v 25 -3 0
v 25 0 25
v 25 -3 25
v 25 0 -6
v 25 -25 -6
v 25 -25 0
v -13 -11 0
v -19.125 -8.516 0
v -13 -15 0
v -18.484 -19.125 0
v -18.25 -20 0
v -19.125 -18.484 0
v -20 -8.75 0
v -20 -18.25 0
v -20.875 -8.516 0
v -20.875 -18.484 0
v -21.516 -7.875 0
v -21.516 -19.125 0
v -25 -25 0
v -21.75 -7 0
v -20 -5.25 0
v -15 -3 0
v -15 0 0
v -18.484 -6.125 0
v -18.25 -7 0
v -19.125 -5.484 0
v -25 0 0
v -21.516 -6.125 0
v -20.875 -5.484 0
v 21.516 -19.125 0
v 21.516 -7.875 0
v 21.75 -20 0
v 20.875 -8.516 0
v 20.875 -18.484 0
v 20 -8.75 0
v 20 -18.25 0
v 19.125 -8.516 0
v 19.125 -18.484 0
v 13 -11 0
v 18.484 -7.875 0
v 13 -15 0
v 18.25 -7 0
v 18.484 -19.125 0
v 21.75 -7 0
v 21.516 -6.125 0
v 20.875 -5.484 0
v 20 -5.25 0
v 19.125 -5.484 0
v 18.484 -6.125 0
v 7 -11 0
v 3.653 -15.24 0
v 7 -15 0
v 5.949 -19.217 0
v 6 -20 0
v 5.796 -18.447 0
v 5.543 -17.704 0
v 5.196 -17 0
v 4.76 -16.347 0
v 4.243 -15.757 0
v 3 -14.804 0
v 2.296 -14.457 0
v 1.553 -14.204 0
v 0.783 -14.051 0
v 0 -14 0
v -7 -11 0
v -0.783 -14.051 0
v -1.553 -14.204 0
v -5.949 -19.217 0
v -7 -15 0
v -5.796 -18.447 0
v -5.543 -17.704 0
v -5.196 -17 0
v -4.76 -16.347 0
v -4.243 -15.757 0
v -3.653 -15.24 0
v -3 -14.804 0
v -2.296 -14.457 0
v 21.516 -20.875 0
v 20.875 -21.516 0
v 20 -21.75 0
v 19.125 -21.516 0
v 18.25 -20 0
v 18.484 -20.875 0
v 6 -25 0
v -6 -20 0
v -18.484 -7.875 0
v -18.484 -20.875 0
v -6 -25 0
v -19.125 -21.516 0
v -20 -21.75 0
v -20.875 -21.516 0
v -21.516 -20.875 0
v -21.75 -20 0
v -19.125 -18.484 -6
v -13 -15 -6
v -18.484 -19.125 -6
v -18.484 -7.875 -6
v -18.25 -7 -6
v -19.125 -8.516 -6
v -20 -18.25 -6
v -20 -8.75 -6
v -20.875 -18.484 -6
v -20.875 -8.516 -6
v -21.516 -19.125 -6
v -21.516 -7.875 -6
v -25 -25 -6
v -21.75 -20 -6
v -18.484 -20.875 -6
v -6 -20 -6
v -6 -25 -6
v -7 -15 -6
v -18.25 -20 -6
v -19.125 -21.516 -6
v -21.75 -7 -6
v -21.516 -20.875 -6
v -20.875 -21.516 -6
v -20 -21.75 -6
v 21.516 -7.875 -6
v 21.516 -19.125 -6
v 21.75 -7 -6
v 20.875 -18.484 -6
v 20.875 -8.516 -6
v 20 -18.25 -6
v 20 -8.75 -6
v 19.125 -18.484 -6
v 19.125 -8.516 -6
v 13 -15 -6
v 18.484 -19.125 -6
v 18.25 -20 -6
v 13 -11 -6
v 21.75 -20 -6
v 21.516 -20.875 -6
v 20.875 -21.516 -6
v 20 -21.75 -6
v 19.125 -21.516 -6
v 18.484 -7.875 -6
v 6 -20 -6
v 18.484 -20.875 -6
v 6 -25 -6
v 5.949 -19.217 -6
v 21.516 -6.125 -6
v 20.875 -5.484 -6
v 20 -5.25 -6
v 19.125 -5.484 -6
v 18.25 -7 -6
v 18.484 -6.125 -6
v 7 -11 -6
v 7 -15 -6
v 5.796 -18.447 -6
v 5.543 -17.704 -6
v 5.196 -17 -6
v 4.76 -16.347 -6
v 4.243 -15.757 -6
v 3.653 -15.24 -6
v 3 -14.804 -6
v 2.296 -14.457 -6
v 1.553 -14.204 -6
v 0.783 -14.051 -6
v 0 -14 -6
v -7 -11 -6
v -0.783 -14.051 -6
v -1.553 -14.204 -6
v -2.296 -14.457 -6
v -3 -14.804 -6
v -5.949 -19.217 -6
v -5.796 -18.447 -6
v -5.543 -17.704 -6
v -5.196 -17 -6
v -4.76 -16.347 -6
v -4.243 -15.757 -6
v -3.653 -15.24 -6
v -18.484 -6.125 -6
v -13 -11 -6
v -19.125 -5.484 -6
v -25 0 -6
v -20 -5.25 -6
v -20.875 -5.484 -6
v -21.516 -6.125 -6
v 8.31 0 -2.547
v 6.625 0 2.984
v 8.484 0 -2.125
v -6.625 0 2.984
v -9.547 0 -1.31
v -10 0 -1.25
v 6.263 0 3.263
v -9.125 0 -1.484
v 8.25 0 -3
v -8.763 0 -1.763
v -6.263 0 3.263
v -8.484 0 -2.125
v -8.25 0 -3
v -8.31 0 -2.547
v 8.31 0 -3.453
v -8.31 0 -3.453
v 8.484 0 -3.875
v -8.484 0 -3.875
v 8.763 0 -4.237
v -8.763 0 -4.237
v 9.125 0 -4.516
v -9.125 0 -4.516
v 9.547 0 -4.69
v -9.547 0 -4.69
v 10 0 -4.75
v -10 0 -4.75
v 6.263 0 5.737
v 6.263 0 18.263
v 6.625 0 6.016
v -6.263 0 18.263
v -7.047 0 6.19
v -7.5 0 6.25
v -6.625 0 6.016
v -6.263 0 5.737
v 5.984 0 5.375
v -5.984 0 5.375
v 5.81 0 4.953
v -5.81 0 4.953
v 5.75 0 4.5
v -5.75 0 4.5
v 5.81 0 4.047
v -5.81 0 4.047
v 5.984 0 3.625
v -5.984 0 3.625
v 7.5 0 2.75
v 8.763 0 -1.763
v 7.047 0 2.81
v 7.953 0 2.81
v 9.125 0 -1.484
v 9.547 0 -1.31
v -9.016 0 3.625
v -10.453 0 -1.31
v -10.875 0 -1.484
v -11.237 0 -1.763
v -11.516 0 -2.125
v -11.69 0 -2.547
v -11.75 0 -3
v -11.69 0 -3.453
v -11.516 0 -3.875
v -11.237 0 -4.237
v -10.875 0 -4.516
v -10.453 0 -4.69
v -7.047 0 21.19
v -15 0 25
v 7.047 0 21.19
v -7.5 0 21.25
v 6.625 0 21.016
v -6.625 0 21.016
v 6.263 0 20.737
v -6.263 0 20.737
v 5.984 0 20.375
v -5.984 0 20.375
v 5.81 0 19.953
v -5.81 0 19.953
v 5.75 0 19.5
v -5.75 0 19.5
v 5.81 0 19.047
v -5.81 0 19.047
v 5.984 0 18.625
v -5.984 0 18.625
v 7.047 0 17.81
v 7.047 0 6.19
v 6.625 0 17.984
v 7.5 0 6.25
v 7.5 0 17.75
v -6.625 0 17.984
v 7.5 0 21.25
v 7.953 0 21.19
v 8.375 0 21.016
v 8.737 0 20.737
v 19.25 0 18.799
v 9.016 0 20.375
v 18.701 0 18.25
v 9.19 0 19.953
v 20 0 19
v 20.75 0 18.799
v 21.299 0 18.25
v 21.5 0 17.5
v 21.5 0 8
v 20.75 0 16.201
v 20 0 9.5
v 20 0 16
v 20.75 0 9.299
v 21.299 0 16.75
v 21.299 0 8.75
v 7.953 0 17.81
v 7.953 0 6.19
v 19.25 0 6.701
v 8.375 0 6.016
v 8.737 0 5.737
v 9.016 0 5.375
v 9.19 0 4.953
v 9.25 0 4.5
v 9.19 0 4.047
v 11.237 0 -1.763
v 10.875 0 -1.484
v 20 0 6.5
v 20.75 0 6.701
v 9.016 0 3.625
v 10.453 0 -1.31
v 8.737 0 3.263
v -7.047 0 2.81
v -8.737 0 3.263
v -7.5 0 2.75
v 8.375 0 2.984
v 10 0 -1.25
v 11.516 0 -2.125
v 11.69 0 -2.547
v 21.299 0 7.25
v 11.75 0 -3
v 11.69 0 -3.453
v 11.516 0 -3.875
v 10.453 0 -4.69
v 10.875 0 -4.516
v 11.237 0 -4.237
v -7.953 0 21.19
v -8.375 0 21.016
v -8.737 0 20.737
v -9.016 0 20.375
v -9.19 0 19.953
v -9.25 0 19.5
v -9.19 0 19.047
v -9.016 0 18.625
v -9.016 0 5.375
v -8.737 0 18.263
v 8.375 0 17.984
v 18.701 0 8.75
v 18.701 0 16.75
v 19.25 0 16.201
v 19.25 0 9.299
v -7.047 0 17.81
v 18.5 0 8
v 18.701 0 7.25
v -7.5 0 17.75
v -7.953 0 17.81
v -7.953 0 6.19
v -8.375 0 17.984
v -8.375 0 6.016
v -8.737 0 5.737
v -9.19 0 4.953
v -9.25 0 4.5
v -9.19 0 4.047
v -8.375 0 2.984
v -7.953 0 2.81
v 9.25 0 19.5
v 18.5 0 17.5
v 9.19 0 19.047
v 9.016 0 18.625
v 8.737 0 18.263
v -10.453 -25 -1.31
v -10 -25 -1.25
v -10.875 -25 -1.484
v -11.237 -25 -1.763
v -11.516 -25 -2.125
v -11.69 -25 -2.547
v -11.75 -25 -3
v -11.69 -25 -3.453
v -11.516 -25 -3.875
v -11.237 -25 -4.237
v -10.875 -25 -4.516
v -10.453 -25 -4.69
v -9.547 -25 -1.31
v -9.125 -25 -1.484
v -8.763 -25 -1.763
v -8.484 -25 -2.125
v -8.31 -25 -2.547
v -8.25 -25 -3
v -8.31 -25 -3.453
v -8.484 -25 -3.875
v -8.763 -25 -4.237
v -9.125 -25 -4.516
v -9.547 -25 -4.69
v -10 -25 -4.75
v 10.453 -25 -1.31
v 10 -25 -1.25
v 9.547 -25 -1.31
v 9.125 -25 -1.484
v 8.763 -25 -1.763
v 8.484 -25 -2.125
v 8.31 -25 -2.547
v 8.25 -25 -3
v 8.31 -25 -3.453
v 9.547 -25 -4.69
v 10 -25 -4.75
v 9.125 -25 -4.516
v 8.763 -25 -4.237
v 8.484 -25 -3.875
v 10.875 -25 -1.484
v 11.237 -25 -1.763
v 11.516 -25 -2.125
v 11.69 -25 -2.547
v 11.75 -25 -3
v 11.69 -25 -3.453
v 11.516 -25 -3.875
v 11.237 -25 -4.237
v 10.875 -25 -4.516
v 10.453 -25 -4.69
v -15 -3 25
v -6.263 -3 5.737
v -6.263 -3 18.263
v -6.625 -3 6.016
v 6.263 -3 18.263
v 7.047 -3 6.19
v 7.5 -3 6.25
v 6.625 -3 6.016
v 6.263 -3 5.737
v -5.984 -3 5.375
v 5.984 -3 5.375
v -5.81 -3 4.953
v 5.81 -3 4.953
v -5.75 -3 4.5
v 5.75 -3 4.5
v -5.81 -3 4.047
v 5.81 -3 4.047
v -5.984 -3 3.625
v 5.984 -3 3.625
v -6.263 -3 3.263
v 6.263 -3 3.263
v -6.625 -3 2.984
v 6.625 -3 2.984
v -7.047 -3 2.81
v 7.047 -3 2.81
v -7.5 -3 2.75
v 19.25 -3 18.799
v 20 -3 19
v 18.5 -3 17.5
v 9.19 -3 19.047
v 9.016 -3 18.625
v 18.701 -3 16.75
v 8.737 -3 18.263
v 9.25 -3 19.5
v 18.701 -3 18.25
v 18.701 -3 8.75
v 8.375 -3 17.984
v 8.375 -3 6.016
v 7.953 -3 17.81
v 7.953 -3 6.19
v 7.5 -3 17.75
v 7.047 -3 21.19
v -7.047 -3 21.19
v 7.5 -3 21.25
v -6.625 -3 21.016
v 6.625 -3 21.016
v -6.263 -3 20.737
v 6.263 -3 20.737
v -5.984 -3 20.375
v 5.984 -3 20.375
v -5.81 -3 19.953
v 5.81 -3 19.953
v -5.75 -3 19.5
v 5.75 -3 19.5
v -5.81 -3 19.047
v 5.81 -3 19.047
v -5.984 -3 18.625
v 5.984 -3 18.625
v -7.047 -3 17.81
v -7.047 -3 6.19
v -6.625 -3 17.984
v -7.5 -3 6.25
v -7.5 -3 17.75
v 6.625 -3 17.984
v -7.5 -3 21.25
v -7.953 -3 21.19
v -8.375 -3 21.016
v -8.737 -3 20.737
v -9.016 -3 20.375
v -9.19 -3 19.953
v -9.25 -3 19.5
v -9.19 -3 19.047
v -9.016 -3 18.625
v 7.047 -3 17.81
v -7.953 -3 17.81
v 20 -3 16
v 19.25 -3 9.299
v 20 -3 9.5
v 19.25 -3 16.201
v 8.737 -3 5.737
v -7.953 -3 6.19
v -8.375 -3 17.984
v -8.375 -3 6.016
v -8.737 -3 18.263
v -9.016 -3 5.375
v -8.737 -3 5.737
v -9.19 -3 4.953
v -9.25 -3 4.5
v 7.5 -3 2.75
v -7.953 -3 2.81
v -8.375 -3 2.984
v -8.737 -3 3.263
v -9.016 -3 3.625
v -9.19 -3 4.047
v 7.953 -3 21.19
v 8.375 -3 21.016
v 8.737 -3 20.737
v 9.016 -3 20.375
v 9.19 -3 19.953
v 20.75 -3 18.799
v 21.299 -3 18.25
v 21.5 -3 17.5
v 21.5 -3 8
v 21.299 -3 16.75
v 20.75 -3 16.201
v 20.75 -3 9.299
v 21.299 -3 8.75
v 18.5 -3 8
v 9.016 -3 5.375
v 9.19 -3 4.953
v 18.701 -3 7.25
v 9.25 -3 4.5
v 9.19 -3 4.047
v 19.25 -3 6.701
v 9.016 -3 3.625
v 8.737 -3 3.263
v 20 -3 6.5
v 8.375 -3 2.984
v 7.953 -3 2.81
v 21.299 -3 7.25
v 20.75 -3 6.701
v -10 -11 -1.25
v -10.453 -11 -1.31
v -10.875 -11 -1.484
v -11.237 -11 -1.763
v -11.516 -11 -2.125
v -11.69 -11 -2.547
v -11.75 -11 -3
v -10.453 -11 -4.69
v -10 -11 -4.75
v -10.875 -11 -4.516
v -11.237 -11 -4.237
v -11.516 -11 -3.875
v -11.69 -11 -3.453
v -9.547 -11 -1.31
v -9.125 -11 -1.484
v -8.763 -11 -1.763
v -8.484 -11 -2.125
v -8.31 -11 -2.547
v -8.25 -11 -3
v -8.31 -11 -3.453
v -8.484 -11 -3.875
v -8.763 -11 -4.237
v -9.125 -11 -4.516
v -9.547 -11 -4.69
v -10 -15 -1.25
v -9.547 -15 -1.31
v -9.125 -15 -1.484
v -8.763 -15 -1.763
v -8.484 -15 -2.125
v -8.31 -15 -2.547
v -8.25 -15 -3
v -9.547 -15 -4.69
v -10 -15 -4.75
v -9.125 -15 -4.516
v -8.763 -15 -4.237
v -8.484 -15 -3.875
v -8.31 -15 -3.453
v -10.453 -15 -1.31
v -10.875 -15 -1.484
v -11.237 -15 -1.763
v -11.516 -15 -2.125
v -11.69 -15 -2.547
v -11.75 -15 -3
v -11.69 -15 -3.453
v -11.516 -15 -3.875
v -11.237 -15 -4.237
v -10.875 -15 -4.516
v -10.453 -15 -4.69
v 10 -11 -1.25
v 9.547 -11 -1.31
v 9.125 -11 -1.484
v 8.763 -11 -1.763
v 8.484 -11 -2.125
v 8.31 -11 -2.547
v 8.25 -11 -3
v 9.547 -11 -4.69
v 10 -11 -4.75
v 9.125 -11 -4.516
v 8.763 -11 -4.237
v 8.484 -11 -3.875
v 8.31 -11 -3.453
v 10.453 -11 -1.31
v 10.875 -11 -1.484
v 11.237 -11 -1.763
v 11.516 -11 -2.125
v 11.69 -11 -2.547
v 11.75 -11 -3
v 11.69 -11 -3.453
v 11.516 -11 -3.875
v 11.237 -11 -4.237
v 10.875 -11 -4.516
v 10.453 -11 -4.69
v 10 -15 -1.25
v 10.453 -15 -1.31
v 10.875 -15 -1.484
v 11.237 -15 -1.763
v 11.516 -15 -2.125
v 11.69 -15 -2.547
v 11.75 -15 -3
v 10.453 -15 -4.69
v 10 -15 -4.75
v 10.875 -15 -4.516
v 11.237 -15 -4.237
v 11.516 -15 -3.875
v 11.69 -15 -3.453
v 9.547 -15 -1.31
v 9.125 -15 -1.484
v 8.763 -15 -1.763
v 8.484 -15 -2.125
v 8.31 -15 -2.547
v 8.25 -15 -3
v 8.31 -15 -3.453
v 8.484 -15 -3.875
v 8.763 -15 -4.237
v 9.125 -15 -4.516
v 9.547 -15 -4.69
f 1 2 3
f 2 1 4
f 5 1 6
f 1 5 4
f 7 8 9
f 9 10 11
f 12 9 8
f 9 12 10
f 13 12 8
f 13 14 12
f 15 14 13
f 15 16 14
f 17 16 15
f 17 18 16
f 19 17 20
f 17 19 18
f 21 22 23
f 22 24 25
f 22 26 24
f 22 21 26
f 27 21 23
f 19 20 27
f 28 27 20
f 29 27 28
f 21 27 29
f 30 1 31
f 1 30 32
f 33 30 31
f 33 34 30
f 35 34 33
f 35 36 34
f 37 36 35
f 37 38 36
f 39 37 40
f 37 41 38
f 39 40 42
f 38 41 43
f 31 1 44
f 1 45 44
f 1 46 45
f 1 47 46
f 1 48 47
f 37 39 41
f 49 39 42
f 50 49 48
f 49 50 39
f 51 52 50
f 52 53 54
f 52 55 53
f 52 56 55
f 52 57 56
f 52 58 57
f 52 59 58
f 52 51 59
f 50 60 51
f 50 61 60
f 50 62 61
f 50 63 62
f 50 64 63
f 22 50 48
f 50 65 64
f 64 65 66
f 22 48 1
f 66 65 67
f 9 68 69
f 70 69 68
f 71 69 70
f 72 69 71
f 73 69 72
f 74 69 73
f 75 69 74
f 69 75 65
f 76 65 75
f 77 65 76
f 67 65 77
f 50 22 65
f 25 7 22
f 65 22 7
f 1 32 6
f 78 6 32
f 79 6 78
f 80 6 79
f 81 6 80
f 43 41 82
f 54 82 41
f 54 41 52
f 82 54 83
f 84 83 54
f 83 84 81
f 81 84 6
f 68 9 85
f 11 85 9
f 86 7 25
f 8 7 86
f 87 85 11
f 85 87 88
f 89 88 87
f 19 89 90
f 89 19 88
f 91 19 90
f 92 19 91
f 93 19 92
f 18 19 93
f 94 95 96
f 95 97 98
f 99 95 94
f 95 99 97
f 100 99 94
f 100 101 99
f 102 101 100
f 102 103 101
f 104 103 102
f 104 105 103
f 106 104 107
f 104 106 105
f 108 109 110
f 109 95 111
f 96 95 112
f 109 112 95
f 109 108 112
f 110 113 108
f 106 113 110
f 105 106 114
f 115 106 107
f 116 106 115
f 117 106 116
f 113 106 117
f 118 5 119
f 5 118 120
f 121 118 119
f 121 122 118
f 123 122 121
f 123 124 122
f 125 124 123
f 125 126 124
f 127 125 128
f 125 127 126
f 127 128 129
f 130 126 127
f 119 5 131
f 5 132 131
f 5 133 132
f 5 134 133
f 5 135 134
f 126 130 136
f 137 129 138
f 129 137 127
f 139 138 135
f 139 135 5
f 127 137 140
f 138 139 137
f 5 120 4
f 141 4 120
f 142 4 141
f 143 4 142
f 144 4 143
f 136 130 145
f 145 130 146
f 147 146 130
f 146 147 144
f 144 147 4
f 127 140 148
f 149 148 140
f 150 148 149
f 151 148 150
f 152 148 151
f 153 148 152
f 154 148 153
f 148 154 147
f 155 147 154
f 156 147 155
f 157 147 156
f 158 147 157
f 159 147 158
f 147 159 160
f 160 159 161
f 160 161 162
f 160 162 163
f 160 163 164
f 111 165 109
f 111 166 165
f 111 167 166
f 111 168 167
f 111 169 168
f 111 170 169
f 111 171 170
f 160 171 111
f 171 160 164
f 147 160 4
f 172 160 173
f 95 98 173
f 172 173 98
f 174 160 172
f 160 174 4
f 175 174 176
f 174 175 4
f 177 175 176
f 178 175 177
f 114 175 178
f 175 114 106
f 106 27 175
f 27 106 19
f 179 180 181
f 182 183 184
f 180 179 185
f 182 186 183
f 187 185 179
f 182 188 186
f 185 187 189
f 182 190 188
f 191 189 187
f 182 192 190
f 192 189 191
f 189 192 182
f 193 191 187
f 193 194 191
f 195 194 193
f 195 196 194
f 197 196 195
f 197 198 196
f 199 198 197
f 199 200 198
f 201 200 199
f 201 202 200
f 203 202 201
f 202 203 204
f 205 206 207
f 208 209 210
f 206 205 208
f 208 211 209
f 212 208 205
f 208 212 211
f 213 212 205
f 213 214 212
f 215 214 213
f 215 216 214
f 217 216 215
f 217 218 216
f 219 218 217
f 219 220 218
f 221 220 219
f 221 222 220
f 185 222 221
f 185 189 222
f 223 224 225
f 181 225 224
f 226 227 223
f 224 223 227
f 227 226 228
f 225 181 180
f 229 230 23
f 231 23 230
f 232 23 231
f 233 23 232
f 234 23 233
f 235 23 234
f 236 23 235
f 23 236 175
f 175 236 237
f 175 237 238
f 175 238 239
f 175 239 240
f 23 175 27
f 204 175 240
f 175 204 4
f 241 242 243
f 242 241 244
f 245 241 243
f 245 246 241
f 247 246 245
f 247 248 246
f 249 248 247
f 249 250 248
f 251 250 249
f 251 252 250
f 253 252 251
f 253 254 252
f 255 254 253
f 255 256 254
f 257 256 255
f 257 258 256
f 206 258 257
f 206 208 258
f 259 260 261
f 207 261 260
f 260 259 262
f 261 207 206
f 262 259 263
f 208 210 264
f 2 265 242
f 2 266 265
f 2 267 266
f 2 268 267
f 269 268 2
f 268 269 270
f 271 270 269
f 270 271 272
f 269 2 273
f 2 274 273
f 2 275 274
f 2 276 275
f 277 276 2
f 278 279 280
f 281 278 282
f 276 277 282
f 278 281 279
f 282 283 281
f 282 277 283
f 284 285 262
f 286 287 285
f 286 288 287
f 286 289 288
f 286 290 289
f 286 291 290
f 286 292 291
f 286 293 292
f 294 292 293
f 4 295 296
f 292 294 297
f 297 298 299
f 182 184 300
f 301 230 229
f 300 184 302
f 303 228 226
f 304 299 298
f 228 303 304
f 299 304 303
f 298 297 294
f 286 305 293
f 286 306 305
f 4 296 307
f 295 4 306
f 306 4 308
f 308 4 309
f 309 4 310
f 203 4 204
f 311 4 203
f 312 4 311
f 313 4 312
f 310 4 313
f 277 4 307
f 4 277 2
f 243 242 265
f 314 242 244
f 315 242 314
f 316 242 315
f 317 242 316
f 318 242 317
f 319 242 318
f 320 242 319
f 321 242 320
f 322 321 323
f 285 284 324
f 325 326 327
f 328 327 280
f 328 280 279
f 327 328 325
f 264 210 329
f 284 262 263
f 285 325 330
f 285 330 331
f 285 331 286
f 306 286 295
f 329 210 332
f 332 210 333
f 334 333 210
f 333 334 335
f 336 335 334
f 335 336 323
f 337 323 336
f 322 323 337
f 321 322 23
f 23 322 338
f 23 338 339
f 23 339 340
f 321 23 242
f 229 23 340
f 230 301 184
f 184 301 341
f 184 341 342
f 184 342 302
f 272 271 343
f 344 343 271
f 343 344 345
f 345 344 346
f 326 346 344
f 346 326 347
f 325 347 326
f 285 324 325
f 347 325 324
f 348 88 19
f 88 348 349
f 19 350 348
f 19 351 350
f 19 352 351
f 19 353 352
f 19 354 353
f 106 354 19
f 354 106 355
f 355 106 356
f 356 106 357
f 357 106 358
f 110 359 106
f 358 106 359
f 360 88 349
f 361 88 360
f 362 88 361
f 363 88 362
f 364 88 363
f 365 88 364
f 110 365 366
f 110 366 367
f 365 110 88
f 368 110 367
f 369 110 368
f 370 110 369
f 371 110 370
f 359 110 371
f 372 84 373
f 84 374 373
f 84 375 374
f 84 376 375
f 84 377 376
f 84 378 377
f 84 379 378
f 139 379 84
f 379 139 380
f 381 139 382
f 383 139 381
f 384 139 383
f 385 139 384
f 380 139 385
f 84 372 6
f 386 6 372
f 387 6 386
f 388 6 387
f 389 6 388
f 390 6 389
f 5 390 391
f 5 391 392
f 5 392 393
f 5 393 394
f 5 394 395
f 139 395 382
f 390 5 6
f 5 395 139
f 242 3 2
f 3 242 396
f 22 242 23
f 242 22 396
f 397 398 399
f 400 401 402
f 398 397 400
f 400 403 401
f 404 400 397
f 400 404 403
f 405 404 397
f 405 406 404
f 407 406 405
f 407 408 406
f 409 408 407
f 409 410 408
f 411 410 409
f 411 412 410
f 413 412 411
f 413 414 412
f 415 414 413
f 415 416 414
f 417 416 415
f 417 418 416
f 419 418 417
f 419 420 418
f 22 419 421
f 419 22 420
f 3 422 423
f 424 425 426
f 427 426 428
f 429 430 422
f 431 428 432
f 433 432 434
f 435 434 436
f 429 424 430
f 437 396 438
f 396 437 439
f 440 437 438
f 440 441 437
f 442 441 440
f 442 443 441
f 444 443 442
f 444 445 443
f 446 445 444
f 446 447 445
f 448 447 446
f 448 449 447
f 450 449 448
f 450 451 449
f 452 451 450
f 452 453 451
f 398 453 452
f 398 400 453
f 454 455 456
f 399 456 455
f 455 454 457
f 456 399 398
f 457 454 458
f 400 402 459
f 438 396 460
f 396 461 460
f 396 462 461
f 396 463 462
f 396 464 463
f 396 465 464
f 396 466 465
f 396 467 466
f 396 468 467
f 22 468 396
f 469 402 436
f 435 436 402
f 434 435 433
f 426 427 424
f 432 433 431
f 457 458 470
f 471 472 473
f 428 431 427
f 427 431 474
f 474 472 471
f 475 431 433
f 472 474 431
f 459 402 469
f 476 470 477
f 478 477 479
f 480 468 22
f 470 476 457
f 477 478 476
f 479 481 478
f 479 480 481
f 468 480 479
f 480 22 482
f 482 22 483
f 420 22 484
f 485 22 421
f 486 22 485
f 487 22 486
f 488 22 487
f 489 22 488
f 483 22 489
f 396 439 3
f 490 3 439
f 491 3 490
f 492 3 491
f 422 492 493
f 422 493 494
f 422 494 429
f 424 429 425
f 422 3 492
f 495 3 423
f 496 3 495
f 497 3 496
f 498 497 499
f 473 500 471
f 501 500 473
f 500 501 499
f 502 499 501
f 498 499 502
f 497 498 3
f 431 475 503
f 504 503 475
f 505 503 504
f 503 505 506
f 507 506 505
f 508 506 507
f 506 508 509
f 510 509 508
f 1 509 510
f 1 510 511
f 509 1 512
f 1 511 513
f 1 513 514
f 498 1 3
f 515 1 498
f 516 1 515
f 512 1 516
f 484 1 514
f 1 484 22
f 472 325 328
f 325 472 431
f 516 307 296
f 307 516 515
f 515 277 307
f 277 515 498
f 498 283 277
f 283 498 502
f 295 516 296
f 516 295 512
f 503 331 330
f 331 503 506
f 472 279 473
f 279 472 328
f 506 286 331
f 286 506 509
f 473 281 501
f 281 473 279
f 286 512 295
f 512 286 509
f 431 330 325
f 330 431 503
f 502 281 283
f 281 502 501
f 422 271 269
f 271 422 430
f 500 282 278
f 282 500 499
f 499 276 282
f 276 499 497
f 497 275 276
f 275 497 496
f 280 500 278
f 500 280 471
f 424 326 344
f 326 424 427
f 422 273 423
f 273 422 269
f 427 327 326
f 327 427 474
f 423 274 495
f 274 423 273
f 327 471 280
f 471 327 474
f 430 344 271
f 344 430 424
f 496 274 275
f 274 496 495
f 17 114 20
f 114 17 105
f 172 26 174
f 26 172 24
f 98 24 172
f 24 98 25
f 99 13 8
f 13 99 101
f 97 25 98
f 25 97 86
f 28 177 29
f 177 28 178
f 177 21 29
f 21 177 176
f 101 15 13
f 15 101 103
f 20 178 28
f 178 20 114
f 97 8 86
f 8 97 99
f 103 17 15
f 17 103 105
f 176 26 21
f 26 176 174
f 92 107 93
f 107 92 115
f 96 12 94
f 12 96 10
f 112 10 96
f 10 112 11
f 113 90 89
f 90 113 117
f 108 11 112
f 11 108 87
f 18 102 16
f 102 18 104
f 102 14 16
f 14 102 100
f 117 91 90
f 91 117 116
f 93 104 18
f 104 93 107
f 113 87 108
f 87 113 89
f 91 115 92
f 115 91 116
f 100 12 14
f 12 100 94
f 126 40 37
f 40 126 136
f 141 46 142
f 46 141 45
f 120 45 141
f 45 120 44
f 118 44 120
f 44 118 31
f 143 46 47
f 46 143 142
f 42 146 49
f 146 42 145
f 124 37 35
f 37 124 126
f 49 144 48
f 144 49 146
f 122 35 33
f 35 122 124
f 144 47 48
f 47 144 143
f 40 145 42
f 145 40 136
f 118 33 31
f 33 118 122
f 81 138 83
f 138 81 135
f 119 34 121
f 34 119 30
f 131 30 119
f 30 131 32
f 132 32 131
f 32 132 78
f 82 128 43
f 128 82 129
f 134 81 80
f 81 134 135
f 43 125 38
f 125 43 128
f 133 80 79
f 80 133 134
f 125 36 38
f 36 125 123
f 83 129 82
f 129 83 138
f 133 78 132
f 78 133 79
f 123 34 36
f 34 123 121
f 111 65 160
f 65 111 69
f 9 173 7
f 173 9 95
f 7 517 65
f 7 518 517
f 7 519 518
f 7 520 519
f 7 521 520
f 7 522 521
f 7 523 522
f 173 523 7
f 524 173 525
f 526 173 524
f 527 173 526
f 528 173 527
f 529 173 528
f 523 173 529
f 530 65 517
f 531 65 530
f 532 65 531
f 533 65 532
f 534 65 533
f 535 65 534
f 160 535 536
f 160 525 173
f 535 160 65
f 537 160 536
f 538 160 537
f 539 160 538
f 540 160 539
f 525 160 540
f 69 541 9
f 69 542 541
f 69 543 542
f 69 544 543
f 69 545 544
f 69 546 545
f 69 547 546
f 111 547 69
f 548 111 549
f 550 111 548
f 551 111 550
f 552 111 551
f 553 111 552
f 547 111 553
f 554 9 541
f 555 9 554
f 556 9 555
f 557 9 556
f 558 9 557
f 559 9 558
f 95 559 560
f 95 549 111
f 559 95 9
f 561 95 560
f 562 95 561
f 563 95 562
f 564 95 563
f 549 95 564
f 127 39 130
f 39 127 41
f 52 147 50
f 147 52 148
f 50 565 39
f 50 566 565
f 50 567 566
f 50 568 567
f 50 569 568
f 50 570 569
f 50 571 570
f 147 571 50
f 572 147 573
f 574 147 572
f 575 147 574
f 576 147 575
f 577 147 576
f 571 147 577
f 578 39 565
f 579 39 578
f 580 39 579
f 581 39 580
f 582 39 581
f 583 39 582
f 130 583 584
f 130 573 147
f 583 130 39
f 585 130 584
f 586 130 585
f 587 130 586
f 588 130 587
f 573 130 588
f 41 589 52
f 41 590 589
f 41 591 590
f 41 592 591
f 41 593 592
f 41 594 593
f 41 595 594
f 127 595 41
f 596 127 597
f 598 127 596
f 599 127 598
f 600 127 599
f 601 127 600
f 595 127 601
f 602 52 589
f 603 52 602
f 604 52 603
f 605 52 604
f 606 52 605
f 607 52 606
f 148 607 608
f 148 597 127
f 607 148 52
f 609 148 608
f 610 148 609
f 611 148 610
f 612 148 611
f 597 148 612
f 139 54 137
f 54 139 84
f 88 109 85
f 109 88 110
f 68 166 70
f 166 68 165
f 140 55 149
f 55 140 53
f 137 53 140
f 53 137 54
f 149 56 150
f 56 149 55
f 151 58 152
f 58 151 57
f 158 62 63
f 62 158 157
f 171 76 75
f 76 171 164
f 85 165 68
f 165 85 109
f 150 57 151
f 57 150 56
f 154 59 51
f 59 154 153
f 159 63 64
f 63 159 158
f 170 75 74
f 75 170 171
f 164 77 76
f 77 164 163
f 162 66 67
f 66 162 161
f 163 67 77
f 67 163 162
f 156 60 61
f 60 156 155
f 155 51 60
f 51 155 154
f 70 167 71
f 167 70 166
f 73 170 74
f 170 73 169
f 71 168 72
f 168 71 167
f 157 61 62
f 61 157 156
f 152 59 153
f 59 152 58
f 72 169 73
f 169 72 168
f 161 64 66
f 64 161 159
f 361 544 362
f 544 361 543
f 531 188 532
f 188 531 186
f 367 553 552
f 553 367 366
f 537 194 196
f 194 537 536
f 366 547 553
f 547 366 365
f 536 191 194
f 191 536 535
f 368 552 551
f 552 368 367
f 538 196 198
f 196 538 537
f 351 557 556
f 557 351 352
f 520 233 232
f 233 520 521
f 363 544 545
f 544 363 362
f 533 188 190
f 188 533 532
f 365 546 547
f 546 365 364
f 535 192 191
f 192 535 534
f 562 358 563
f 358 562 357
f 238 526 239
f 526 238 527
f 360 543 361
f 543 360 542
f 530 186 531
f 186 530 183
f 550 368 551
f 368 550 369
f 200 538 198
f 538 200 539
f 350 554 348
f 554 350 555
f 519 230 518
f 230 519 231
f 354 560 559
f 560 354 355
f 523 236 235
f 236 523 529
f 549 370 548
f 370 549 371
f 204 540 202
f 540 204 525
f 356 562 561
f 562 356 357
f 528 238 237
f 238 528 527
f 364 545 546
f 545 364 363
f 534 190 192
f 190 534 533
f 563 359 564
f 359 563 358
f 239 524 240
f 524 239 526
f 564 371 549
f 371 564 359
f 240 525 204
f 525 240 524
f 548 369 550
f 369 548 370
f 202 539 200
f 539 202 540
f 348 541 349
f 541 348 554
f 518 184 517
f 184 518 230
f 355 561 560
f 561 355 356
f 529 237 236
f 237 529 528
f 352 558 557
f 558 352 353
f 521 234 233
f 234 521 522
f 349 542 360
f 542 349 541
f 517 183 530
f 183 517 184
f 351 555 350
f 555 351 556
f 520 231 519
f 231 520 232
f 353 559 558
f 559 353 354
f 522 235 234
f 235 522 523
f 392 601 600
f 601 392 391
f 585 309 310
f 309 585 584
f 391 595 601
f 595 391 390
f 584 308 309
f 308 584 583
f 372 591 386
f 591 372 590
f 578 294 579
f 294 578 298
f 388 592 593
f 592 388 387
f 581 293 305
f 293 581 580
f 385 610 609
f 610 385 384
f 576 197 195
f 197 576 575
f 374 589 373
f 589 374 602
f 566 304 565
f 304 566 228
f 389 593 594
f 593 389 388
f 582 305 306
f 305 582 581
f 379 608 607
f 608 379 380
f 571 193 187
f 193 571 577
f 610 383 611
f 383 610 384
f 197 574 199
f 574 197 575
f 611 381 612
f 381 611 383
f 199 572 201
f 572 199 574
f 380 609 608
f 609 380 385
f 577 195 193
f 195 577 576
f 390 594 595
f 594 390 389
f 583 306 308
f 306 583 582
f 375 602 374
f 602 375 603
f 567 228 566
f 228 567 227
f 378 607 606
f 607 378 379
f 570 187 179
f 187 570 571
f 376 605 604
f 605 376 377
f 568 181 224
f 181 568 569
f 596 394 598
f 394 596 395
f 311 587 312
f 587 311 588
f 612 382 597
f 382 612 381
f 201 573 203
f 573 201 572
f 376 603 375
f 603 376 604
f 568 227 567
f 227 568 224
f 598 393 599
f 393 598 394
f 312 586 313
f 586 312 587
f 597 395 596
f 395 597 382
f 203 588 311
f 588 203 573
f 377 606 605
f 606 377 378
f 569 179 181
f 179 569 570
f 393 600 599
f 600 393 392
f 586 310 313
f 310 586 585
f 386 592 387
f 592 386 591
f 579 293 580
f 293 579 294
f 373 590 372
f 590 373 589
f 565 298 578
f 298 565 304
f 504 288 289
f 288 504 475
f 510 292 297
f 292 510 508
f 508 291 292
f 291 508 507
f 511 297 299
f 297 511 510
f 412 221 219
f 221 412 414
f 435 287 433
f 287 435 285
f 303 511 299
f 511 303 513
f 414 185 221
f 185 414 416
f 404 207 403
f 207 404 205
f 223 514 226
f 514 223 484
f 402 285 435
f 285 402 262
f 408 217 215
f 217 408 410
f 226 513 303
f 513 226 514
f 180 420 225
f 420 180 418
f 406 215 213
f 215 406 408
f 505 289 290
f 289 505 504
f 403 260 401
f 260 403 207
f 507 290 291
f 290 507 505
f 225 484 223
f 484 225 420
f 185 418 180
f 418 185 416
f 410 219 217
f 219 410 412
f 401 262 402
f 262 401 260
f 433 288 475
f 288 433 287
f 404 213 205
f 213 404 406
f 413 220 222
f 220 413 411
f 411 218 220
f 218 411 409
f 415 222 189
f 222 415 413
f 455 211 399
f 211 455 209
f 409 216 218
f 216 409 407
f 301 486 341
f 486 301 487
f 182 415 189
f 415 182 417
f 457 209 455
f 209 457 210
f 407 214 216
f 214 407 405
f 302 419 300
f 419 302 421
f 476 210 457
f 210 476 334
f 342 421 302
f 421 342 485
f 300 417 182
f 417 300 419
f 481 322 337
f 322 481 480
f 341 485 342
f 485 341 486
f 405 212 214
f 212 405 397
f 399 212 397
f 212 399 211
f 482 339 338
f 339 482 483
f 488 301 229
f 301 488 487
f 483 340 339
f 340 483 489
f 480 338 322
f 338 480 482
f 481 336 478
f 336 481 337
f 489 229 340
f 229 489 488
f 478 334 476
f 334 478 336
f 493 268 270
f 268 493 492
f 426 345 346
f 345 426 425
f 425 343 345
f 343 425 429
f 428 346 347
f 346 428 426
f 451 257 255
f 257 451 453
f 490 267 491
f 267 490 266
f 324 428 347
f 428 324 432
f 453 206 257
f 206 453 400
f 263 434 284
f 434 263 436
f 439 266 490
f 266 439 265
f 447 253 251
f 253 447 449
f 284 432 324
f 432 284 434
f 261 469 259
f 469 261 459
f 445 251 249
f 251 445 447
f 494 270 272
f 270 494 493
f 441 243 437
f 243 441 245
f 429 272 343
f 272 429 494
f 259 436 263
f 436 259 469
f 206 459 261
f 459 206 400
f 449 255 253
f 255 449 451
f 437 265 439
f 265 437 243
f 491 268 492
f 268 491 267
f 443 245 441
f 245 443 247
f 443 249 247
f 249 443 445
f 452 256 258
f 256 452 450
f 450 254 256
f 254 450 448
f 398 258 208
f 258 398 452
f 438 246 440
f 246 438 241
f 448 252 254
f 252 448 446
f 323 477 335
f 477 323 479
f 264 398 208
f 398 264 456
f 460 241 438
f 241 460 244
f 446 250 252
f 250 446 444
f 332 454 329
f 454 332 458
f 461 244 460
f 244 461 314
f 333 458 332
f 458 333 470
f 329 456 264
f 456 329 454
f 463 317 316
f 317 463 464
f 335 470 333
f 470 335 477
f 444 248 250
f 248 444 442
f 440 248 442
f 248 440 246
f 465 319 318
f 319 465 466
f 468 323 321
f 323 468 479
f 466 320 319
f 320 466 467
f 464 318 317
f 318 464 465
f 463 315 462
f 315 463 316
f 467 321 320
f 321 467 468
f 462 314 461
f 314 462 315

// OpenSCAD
difference()
{
    union()
    {
        translate([-15-10,-25,-6])
            cube([30+20,25,6]);
        
        translate([-15,-3,0])
            cube([30+10,3,25]);
    }
    union()
    {
        translate([25-5,-4,8])
            rotate([270,0,0])
                cylinder(d=3,h=20,$fn=12);
        translate([25-5,-4,8+9.5])
            rotate([270,0,0])
                cylinder(d=3,h=20,$fn=12);
        
        
        translate([-20,-7,-6])
            cylinder(d=3.5,h=6,$fn=12);
        translate([-20,-20,-6])
            cylinder(d=3.5,h=6,$fn=12);
        
        
        translate([20,-7,-6])
            cylinder(d=3.5,h=6,$fn=12);
        translate([20,-20,-6])
            cylinder(d=3.5,h=6,$fn=12);
        
        
        translate([-10-3,-15,-6])
            cube([6,4,6]);
        
        translate([10-3,-15,-6])
            cube([6,4,6]);
        
        translate([-6,-25,-6])
            cube([12,5,6]);
        
        translate([0,-20,-6])
            cylinder(d=12,h=6,$fn=48);
        
        translate([-10,-25,-3])
            rotate([270,0,0])
                cylinder(d=3.5,h=40,$fn=24);
        translate([10,-25,-3])
            rotate([270,0,0])
                cylinder(d=3.5,h=40,$fn=24);
        
        
        translate([7.5,-4,12-7.5])
            rotate([270,0,0])
                cylinder(d=3.5,h=20,$fn=24);
        translate([-7.5,-4,12-7.5])
            rotate([270,0,0])
                cylinder(d=3.5,h=20,$fn=24);
        translate([7.5,-4,12+7.5])
            rotate([270,0,0])
                cylinder(d=3.5,h=20,$fn=24);
        translate([-7.5,-4,12+7.5])
            rotate([270,0,0])
                cylinder(d=3.5,h=20,$fn=24);
    }
}
